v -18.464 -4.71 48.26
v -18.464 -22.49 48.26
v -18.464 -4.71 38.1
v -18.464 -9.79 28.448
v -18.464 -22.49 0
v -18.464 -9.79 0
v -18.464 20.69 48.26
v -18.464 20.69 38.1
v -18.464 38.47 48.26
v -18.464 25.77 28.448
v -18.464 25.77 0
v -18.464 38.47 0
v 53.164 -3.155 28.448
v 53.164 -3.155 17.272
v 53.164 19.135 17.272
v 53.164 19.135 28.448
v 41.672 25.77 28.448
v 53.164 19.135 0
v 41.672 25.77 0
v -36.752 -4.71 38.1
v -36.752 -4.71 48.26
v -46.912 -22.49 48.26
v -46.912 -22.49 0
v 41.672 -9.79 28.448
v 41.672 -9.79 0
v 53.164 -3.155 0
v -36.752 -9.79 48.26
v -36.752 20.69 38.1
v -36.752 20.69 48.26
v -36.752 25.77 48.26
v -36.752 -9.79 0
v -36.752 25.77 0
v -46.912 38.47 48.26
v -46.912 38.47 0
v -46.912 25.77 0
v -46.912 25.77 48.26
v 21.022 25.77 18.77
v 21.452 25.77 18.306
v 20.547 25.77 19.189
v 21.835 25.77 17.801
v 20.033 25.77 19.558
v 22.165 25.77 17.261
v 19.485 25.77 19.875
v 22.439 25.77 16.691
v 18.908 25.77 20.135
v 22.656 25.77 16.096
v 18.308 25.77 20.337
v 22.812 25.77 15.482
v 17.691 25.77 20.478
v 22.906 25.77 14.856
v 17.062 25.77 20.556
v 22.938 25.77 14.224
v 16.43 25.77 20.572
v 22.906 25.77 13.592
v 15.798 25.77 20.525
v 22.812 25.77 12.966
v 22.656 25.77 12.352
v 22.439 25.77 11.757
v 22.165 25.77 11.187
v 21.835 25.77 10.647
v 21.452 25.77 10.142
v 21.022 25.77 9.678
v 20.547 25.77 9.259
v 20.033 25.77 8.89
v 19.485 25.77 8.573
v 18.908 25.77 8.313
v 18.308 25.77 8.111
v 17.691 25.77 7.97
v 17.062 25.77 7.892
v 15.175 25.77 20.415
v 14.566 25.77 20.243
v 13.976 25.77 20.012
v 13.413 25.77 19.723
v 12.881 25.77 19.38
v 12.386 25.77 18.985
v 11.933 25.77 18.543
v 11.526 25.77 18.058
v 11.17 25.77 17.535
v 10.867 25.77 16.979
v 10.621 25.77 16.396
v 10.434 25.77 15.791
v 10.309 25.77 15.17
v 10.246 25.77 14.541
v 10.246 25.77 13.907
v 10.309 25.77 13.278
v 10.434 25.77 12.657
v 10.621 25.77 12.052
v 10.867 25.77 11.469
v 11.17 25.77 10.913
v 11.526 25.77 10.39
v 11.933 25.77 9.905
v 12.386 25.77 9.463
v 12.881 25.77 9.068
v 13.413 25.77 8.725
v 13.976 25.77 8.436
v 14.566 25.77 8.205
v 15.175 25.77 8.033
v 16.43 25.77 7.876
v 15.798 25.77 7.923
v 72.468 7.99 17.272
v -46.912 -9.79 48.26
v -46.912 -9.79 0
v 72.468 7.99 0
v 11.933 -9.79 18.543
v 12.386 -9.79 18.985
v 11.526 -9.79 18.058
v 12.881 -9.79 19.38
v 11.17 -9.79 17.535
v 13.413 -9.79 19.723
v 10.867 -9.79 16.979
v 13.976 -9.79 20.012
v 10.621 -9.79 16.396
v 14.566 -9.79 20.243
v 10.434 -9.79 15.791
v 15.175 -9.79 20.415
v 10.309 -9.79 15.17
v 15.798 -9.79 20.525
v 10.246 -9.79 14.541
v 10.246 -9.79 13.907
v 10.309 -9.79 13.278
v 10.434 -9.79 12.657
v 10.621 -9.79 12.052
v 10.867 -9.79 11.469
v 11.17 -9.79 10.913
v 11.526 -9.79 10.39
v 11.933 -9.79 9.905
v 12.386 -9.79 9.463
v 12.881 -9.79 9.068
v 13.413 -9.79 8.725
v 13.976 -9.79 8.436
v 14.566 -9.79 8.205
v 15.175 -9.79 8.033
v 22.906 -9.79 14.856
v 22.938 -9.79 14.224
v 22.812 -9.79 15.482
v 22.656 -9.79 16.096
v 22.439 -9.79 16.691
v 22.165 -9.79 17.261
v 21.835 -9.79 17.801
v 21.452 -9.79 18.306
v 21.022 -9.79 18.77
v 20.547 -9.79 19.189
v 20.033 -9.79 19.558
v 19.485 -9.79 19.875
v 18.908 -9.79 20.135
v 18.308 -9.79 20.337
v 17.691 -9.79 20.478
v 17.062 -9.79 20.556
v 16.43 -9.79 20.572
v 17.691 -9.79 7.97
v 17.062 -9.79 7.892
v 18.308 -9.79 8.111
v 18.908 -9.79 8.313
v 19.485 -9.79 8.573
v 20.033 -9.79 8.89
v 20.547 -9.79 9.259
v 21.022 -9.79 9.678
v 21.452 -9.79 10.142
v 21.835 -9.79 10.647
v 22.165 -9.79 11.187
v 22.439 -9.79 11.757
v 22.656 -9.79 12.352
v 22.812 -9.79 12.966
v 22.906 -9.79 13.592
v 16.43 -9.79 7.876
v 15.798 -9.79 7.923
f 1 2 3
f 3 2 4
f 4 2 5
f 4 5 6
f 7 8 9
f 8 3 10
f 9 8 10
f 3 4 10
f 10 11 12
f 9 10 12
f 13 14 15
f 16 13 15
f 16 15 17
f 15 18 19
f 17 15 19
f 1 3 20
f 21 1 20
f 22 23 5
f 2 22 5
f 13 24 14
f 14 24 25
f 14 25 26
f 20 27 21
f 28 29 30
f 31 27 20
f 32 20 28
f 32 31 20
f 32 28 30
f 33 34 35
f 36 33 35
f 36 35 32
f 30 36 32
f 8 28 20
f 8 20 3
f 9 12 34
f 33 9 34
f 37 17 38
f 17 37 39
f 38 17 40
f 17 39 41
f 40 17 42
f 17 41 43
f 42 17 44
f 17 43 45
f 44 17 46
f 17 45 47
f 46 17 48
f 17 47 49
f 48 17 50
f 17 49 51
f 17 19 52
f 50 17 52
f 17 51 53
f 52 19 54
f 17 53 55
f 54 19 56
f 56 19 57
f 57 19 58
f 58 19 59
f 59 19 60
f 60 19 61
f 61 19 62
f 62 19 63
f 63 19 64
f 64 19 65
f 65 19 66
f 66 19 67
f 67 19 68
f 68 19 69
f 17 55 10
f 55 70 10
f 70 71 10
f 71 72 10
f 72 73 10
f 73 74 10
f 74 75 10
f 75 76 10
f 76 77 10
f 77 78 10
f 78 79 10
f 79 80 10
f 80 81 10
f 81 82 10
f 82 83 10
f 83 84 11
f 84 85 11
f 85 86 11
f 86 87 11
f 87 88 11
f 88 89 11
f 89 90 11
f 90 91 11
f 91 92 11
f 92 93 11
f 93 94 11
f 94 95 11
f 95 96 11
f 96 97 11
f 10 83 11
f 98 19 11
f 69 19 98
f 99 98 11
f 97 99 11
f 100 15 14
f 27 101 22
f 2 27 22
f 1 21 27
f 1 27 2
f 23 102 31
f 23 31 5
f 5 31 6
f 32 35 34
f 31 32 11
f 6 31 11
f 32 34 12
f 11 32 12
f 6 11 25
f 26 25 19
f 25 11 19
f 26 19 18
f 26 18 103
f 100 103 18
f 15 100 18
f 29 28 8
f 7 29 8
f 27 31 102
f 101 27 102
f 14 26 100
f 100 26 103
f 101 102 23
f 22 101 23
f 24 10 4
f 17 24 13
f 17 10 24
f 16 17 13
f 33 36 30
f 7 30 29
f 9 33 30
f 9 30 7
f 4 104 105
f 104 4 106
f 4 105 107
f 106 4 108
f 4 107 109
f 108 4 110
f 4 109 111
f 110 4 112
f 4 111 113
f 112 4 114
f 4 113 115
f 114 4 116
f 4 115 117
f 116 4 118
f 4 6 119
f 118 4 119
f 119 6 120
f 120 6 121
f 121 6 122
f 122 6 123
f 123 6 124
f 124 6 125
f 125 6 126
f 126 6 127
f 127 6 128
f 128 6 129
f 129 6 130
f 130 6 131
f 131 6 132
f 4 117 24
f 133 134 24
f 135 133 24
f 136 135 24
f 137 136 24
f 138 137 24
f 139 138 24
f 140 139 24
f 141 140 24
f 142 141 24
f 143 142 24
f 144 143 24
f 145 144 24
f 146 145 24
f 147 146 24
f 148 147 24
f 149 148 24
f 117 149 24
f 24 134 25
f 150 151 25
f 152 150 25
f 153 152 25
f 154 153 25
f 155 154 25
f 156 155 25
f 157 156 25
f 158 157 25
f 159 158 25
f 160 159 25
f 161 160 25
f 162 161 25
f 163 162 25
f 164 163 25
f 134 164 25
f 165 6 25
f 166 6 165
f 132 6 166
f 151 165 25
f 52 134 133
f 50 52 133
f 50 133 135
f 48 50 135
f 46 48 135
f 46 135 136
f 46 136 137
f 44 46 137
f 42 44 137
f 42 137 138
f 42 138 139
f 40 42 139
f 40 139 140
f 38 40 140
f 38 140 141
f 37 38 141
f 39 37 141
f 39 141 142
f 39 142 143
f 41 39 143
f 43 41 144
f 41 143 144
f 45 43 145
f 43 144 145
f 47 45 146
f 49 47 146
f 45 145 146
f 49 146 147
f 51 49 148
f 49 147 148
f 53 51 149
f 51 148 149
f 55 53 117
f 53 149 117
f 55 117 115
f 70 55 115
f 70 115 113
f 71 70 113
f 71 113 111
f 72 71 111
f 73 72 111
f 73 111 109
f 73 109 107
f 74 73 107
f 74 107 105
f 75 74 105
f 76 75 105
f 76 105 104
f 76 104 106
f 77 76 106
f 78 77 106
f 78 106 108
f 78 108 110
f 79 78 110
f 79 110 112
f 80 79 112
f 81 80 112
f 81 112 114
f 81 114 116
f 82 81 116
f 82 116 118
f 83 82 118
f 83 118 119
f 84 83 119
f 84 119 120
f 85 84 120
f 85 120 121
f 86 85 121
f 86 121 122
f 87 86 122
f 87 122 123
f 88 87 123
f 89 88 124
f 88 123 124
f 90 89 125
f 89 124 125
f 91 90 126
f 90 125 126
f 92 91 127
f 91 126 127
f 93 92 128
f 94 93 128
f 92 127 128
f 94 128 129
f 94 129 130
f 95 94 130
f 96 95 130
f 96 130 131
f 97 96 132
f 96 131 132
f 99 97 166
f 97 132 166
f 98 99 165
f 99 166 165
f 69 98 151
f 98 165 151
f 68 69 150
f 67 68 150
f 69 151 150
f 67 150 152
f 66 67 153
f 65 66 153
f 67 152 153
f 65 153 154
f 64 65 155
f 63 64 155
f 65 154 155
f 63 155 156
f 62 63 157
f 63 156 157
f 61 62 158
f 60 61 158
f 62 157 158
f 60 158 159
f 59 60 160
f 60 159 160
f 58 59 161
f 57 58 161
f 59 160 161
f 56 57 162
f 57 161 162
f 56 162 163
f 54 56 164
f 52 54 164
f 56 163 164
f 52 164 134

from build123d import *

# Parameters (mm, degrees)
F1_DEPTH = 28.448
F2_DEPTH = 17.272
F3_DEPTH = 48.26
F0_W     = 18.288
F0_H     = 25.4
F4_DEPTH = 38.1
F5_R     = 6.35
F6_DEPTH = 53.34


with BuildPart() as f1:
    # F0 (on Top) → F1 (new body)
    with BuildSketch(Plane.XY):
        Polygon((41.672072, 25.770297), (-18.464064, 25.770297), (-18.464064, 20.690297), (-18.464064, -4.709703), (-18.464064, -9.789703), (41.672072, -9.789703), (53.163936, -3.154872), (53.163936, 19.135467), align=None)
    extrude(amount=F1_DEPTH)

    # F0 (on Top) → F2 (join)
    with BuildSketch(Plane.XY):
        Polygon((72.467936, 7.990297), (53.163936, 19.135467), (53.163936, -3.154872), align=None)
    extrude(amount=F2_DEPTH)

    # F0 (on Top) → F3 (join)
    with BuildSketch(Plane.XY):
        Polygon((-18.464064, 38.470297), (-46.912064, 38.470297), (-46.912064, 25.770297), (-36.752064, 25.770297), (-36.752064, 20.690297), (-18.464064, 20.690297), (-18.464064, 25.770297), align=None)
        Polygon((-18.464064, -9.789703), (-18.464064, -4.709703), (-36.752064, -4.709703), (-36.752064, -9.789703), (-46.912064, -9.789703), (-46.912064, -22.489703), (-18.464064, -22.489703), align=None)
    extrude(amount=F3_DEPTH)

    # F0 (on Top) → F4 (join)
    with BuildSketch(Plane.XY):
        with Locations((-27.608064, 7.990297)):
            Rectangle(F0_W, F0_H)
    extrude(amount=F4_DEPTH)

    # F5 (on face) → F6 (cut)
    with BuildSketch(Plane.XZ.offset(9.789703)):
        with Locations((16.587936, 14.224)):
            Circle(F5_R)
    extrude(amount=-F6_DEPTH, mode=Mode.SUBTRACT)


solid = f1.part
